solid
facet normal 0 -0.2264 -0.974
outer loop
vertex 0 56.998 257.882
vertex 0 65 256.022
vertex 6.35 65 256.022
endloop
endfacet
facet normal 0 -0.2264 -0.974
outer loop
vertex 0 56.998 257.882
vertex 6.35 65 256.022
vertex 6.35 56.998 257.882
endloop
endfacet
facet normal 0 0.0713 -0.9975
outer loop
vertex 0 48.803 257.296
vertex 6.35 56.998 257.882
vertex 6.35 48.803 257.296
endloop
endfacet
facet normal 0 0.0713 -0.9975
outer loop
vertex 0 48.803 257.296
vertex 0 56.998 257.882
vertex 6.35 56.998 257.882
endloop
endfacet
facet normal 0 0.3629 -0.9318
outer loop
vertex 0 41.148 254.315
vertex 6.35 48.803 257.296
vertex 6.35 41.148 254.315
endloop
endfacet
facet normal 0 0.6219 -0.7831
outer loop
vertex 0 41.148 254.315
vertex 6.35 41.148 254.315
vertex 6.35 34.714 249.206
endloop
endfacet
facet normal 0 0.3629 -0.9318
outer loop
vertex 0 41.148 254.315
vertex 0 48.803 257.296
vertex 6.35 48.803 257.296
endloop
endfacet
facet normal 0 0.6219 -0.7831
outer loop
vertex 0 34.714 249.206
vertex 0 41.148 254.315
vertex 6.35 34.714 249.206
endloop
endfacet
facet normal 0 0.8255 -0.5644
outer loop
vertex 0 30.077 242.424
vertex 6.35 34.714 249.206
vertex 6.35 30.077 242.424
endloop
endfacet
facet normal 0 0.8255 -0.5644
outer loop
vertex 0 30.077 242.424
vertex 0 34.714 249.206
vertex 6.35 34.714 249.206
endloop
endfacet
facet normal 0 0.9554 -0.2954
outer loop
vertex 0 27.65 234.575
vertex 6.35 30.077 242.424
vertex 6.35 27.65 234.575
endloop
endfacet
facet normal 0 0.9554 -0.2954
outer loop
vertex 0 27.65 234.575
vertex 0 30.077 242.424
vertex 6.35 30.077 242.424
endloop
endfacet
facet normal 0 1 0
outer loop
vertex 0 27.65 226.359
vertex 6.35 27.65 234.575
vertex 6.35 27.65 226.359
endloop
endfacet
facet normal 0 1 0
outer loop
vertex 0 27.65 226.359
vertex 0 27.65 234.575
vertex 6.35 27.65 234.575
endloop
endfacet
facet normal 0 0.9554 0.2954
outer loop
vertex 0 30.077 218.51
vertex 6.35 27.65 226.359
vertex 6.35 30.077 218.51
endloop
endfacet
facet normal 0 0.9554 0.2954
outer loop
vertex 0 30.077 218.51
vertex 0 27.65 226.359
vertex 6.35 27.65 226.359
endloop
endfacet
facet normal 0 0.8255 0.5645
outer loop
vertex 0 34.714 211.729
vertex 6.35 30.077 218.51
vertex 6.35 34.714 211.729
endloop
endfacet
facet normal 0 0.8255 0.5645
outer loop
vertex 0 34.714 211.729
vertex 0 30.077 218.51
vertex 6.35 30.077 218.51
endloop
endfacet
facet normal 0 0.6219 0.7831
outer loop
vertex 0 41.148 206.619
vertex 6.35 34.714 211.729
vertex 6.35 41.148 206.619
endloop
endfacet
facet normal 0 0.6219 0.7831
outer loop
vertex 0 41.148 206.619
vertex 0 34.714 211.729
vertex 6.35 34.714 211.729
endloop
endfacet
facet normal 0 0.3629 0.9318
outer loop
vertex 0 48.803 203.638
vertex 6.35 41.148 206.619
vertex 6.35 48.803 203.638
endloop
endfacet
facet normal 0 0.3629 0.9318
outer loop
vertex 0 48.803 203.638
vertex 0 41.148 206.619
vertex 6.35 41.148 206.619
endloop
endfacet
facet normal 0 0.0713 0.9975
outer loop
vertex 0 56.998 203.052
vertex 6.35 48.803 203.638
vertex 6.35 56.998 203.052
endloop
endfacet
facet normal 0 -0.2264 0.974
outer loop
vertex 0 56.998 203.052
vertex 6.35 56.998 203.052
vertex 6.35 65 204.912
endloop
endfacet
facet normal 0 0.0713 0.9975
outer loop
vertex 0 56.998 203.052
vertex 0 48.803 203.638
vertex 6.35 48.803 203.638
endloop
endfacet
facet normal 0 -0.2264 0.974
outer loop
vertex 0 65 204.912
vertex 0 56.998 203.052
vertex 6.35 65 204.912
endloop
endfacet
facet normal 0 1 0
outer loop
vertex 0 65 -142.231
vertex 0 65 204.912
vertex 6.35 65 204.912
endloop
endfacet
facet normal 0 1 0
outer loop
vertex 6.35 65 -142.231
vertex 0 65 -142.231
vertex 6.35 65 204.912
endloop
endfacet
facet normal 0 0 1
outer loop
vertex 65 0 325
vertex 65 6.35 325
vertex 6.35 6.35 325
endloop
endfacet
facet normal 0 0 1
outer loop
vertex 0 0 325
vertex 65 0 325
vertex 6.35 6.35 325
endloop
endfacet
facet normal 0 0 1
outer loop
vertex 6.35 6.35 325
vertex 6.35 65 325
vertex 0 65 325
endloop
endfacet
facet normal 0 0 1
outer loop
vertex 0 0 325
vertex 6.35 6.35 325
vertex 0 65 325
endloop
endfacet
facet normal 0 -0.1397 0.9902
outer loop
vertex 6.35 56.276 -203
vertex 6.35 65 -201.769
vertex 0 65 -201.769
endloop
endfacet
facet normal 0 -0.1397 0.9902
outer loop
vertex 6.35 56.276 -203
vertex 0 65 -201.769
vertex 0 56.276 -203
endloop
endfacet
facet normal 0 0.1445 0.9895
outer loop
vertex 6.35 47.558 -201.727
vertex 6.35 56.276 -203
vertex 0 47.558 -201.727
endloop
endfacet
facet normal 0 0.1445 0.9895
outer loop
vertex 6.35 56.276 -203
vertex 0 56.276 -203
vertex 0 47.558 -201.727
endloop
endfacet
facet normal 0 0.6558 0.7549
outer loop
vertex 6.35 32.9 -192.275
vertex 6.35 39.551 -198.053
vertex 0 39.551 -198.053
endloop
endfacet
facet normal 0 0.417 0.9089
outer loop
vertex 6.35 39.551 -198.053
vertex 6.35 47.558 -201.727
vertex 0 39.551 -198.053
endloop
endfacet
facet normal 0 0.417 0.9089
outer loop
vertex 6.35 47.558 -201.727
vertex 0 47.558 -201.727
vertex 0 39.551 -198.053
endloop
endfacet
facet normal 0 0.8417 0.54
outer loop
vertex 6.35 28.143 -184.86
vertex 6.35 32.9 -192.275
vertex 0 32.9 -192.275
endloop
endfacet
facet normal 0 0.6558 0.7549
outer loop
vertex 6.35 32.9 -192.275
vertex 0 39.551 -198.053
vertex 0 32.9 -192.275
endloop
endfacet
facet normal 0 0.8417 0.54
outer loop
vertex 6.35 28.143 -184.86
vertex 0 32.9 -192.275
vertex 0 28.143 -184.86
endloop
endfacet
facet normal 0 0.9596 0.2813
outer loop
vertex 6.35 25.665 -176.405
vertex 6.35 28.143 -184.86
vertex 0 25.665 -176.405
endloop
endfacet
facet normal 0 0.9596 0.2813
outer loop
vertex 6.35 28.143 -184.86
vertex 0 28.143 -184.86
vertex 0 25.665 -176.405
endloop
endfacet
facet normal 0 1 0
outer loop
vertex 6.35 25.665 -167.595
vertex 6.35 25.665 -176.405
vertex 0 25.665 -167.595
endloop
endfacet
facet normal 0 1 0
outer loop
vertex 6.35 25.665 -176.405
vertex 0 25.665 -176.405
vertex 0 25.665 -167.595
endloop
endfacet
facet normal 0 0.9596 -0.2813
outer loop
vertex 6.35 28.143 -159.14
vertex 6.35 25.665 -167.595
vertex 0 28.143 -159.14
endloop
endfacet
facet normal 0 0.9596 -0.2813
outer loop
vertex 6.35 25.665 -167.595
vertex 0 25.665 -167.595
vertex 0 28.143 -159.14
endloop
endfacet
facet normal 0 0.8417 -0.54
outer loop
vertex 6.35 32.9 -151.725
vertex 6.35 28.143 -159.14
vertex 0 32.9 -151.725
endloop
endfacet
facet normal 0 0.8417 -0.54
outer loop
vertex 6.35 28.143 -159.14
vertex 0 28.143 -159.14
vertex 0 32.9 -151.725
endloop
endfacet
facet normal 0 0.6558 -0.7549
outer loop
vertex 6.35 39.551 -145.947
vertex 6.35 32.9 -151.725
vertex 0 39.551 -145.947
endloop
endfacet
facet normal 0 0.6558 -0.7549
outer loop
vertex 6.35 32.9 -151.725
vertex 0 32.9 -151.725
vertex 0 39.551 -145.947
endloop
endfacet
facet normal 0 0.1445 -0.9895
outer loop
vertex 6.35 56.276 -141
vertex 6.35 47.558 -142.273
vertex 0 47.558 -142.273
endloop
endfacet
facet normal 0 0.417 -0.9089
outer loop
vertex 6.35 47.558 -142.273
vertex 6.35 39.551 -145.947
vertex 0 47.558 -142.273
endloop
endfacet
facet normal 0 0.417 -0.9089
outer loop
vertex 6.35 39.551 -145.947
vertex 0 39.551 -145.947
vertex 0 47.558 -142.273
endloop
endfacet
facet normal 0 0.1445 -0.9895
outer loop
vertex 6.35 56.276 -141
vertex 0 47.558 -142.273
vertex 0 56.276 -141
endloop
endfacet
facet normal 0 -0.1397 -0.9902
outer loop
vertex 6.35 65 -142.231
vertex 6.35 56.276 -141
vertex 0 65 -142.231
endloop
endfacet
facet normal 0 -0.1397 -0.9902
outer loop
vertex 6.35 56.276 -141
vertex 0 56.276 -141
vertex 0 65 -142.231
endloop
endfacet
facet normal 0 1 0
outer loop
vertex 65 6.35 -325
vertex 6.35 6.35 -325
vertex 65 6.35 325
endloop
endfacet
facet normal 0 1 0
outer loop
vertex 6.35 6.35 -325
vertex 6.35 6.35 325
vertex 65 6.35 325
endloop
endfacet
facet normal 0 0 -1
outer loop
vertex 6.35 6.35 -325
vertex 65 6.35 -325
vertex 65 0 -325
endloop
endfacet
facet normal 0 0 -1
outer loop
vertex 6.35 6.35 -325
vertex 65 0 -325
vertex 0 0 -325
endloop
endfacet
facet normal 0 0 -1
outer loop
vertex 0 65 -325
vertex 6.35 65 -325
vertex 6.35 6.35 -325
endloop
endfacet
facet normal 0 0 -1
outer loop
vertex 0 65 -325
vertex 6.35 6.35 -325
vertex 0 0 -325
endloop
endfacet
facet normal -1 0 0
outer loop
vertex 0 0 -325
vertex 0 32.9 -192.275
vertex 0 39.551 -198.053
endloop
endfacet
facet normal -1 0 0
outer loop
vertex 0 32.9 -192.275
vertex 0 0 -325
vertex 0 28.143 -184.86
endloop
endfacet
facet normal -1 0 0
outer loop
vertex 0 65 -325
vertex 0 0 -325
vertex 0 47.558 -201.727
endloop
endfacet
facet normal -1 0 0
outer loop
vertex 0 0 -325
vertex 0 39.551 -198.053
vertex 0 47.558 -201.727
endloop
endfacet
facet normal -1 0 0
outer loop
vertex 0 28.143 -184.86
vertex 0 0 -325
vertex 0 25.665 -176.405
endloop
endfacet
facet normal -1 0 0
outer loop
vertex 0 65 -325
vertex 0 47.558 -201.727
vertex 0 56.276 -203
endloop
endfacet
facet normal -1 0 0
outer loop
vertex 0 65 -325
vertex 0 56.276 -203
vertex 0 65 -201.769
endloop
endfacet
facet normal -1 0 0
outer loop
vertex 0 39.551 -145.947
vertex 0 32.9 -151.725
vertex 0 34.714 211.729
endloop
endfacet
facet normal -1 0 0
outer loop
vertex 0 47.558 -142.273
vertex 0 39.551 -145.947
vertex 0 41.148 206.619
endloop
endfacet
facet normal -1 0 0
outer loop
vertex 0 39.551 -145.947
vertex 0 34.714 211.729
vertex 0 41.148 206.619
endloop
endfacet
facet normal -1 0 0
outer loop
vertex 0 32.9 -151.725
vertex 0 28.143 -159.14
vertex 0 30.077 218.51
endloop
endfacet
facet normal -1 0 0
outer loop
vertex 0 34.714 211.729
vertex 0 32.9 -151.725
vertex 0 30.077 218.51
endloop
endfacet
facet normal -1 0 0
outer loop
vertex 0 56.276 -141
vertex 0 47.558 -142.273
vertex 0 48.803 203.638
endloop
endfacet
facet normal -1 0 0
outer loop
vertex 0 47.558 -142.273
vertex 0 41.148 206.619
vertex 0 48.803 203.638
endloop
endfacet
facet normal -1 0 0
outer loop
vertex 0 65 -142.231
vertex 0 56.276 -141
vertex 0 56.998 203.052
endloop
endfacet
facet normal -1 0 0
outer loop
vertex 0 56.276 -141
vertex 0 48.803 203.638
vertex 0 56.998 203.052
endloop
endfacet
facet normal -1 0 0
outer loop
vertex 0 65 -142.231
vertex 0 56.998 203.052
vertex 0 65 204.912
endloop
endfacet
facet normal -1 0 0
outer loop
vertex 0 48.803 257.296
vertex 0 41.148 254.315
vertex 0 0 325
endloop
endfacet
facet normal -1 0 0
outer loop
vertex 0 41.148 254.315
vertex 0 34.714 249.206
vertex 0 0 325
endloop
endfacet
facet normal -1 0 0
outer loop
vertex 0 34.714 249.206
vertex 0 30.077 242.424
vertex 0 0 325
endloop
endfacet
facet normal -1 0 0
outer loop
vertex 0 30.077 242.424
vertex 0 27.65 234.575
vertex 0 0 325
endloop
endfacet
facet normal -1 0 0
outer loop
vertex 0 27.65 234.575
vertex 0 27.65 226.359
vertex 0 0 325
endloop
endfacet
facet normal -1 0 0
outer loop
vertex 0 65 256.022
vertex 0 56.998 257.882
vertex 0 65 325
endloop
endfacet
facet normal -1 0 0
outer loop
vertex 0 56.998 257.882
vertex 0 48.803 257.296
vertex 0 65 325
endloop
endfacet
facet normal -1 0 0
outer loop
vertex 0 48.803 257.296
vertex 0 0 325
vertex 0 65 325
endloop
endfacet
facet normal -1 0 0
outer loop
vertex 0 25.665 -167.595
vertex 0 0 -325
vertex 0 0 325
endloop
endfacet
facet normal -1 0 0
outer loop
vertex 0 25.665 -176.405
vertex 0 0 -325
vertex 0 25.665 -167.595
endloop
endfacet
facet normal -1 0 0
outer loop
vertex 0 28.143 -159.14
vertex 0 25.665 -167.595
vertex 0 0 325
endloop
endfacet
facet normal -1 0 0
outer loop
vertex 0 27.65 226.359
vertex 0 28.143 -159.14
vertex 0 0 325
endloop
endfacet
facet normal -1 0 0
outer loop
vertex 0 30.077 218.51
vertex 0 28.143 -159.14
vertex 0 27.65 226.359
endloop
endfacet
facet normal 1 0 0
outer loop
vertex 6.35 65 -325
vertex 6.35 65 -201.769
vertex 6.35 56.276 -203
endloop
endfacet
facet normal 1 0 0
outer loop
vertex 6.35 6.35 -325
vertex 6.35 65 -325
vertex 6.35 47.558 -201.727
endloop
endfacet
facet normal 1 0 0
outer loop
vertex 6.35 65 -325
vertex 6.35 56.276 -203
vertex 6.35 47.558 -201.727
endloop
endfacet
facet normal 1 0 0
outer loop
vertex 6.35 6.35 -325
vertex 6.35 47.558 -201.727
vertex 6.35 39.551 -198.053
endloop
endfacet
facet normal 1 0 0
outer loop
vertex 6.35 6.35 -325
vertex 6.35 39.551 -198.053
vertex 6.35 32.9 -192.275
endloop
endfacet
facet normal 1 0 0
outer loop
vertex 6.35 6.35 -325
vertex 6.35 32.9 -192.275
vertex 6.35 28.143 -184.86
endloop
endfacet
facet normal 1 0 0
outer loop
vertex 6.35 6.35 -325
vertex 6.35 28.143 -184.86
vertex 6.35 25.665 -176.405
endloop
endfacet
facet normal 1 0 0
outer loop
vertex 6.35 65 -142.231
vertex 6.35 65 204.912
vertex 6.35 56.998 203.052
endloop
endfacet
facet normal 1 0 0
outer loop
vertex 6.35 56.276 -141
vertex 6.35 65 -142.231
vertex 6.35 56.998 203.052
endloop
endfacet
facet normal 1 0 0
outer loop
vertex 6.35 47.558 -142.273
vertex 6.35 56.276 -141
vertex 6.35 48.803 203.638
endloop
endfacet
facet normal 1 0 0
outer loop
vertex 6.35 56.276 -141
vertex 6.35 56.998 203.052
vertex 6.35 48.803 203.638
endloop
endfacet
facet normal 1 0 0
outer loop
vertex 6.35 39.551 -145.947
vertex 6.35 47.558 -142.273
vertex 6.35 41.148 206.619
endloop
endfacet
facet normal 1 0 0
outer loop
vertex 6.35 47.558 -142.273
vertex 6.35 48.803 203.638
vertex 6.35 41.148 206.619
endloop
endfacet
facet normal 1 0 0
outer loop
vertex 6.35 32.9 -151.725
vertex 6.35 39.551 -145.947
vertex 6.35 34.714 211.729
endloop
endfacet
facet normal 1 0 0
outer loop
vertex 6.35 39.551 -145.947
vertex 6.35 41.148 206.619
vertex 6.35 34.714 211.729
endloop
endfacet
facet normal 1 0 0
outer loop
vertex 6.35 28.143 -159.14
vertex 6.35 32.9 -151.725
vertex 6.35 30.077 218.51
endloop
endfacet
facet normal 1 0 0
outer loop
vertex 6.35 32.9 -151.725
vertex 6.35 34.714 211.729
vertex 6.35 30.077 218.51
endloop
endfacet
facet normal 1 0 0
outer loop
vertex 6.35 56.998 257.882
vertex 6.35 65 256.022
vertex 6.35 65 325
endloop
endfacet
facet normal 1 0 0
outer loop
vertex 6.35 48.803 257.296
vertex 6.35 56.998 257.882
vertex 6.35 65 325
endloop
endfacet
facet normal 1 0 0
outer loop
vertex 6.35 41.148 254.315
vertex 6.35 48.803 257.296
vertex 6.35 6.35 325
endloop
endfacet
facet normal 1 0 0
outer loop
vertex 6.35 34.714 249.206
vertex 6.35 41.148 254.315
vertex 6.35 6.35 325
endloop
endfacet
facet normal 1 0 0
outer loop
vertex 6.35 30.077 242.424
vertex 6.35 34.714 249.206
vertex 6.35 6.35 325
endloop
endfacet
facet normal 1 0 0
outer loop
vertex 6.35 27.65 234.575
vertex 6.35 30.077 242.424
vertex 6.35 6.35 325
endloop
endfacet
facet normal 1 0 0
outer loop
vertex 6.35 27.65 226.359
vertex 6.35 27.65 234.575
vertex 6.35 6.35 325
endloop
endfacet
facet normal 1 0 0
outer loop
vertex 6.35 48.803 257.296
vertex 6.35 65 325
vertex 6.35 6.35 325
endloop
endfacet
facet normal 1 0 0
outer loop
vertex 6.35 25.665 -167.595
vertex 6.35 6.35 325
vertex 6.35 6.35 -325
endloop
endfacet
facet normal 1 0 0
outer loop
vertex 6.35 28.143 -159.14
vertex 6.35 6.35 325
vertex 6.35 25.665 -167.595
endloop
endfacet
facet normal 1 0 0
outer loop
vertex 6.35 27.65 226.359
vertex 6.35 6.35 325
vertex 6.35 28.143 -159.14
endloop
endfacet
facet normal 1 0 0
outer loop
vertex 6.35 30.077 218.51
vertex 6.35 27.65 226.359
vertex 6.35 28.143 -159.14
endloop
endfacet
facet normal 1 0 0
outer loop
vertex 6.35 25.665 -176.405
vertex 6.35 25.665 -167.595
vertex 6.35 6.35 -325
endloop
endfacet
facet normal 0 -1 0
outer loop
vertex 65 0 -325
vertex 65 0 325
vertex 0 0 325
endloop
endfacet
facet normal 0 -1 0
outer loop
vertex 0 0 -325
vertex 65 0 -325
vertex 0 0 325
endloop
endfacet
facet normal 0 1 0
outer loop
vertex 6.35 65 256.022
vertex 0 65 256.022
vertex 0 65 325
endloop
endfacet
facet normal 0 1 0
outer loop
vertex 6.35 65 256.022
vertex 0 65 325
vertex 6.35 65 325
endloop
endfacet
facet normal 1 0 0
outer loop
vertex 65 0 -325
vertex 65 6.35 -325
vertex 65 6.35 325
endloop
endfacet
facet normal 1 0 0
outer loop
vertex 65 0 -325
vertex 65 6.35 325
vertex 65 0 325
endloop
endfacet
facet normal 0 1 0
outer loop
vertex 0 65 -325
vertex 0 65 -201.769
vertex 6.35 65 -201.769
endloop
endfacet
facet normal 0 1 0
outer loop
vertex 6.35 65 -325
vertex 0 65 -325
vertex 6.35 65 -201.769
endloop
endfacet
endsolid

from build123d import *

# Parameters (mm, degrees)
SALIENTE_EXTRUIR1_DEPTH           = 325
TALADRO3_DEPTH                    = 6.35
TALADRO_DE_MARGEN_PARA_M561_D     = 62
TALADRO_DE_MARGEN_PARA_M561_DEPTH = 287.94
TALADRO_DE_MARGEN_PARA_M561_TIP   = 18.62667919


# Read off the part's stored shape, not the designer's step: Taladro3
with BuildPart() as part:
    # Croquis1 → Saliente-Extruir1 (new, symmetric)
    with BuildSketch(Plane.XY):
        Polygon((0, 0), (0, 65), (6.35, 65), (6.35, 6.35), (65, 6.35), (65, 0), align=None)
    extrude(amount=SALIENTE_EXTRUIR1_DEPTH, both=True)

    # Taladro3 outline → Taladro3 (cut)
    with BuildSketch(Plane.YZ):
        with BuildLine():
            Line((65, 204.912035309), (65, 256.022124888))
            ThreePointArc((65, 256.022124888), (27.341767585, 230.467080098), (65, 204.912035309))
        make_face()
    extrude(amount=TALADRO3_DEPTH, mode=Mode.SUBTRACT)

    # Taladro de margen para M561
    with Locations(Plane(origin=(6.35, 55.113874636, 289.004791986), x_dir=(0, 1, 0), z_dir=(1, 0, 0))):
        with Locations((1.236125364, -461.004791986)):
            Hole(TALADRO_DE_MARGEN_PARA_M561_D / 2, depth=TALADRO_DE_MARGEN_PARA_M561_DEPTH)
            with Locations((0, 0, -(TALADRO_DE_MARGEN_PARA_M561_DEPTH + TALADRO_DE_MARGEN_PARA_M561_TIP / 2))):  # 118° drill point
                Cone(0, TALADRO_DE_MARGEN_PARA_M561_D / 2, TALADRO_DE_MARGEN_PARA_M561_TIP, mode=Mode.SUBTRACT)


solid = part.part
